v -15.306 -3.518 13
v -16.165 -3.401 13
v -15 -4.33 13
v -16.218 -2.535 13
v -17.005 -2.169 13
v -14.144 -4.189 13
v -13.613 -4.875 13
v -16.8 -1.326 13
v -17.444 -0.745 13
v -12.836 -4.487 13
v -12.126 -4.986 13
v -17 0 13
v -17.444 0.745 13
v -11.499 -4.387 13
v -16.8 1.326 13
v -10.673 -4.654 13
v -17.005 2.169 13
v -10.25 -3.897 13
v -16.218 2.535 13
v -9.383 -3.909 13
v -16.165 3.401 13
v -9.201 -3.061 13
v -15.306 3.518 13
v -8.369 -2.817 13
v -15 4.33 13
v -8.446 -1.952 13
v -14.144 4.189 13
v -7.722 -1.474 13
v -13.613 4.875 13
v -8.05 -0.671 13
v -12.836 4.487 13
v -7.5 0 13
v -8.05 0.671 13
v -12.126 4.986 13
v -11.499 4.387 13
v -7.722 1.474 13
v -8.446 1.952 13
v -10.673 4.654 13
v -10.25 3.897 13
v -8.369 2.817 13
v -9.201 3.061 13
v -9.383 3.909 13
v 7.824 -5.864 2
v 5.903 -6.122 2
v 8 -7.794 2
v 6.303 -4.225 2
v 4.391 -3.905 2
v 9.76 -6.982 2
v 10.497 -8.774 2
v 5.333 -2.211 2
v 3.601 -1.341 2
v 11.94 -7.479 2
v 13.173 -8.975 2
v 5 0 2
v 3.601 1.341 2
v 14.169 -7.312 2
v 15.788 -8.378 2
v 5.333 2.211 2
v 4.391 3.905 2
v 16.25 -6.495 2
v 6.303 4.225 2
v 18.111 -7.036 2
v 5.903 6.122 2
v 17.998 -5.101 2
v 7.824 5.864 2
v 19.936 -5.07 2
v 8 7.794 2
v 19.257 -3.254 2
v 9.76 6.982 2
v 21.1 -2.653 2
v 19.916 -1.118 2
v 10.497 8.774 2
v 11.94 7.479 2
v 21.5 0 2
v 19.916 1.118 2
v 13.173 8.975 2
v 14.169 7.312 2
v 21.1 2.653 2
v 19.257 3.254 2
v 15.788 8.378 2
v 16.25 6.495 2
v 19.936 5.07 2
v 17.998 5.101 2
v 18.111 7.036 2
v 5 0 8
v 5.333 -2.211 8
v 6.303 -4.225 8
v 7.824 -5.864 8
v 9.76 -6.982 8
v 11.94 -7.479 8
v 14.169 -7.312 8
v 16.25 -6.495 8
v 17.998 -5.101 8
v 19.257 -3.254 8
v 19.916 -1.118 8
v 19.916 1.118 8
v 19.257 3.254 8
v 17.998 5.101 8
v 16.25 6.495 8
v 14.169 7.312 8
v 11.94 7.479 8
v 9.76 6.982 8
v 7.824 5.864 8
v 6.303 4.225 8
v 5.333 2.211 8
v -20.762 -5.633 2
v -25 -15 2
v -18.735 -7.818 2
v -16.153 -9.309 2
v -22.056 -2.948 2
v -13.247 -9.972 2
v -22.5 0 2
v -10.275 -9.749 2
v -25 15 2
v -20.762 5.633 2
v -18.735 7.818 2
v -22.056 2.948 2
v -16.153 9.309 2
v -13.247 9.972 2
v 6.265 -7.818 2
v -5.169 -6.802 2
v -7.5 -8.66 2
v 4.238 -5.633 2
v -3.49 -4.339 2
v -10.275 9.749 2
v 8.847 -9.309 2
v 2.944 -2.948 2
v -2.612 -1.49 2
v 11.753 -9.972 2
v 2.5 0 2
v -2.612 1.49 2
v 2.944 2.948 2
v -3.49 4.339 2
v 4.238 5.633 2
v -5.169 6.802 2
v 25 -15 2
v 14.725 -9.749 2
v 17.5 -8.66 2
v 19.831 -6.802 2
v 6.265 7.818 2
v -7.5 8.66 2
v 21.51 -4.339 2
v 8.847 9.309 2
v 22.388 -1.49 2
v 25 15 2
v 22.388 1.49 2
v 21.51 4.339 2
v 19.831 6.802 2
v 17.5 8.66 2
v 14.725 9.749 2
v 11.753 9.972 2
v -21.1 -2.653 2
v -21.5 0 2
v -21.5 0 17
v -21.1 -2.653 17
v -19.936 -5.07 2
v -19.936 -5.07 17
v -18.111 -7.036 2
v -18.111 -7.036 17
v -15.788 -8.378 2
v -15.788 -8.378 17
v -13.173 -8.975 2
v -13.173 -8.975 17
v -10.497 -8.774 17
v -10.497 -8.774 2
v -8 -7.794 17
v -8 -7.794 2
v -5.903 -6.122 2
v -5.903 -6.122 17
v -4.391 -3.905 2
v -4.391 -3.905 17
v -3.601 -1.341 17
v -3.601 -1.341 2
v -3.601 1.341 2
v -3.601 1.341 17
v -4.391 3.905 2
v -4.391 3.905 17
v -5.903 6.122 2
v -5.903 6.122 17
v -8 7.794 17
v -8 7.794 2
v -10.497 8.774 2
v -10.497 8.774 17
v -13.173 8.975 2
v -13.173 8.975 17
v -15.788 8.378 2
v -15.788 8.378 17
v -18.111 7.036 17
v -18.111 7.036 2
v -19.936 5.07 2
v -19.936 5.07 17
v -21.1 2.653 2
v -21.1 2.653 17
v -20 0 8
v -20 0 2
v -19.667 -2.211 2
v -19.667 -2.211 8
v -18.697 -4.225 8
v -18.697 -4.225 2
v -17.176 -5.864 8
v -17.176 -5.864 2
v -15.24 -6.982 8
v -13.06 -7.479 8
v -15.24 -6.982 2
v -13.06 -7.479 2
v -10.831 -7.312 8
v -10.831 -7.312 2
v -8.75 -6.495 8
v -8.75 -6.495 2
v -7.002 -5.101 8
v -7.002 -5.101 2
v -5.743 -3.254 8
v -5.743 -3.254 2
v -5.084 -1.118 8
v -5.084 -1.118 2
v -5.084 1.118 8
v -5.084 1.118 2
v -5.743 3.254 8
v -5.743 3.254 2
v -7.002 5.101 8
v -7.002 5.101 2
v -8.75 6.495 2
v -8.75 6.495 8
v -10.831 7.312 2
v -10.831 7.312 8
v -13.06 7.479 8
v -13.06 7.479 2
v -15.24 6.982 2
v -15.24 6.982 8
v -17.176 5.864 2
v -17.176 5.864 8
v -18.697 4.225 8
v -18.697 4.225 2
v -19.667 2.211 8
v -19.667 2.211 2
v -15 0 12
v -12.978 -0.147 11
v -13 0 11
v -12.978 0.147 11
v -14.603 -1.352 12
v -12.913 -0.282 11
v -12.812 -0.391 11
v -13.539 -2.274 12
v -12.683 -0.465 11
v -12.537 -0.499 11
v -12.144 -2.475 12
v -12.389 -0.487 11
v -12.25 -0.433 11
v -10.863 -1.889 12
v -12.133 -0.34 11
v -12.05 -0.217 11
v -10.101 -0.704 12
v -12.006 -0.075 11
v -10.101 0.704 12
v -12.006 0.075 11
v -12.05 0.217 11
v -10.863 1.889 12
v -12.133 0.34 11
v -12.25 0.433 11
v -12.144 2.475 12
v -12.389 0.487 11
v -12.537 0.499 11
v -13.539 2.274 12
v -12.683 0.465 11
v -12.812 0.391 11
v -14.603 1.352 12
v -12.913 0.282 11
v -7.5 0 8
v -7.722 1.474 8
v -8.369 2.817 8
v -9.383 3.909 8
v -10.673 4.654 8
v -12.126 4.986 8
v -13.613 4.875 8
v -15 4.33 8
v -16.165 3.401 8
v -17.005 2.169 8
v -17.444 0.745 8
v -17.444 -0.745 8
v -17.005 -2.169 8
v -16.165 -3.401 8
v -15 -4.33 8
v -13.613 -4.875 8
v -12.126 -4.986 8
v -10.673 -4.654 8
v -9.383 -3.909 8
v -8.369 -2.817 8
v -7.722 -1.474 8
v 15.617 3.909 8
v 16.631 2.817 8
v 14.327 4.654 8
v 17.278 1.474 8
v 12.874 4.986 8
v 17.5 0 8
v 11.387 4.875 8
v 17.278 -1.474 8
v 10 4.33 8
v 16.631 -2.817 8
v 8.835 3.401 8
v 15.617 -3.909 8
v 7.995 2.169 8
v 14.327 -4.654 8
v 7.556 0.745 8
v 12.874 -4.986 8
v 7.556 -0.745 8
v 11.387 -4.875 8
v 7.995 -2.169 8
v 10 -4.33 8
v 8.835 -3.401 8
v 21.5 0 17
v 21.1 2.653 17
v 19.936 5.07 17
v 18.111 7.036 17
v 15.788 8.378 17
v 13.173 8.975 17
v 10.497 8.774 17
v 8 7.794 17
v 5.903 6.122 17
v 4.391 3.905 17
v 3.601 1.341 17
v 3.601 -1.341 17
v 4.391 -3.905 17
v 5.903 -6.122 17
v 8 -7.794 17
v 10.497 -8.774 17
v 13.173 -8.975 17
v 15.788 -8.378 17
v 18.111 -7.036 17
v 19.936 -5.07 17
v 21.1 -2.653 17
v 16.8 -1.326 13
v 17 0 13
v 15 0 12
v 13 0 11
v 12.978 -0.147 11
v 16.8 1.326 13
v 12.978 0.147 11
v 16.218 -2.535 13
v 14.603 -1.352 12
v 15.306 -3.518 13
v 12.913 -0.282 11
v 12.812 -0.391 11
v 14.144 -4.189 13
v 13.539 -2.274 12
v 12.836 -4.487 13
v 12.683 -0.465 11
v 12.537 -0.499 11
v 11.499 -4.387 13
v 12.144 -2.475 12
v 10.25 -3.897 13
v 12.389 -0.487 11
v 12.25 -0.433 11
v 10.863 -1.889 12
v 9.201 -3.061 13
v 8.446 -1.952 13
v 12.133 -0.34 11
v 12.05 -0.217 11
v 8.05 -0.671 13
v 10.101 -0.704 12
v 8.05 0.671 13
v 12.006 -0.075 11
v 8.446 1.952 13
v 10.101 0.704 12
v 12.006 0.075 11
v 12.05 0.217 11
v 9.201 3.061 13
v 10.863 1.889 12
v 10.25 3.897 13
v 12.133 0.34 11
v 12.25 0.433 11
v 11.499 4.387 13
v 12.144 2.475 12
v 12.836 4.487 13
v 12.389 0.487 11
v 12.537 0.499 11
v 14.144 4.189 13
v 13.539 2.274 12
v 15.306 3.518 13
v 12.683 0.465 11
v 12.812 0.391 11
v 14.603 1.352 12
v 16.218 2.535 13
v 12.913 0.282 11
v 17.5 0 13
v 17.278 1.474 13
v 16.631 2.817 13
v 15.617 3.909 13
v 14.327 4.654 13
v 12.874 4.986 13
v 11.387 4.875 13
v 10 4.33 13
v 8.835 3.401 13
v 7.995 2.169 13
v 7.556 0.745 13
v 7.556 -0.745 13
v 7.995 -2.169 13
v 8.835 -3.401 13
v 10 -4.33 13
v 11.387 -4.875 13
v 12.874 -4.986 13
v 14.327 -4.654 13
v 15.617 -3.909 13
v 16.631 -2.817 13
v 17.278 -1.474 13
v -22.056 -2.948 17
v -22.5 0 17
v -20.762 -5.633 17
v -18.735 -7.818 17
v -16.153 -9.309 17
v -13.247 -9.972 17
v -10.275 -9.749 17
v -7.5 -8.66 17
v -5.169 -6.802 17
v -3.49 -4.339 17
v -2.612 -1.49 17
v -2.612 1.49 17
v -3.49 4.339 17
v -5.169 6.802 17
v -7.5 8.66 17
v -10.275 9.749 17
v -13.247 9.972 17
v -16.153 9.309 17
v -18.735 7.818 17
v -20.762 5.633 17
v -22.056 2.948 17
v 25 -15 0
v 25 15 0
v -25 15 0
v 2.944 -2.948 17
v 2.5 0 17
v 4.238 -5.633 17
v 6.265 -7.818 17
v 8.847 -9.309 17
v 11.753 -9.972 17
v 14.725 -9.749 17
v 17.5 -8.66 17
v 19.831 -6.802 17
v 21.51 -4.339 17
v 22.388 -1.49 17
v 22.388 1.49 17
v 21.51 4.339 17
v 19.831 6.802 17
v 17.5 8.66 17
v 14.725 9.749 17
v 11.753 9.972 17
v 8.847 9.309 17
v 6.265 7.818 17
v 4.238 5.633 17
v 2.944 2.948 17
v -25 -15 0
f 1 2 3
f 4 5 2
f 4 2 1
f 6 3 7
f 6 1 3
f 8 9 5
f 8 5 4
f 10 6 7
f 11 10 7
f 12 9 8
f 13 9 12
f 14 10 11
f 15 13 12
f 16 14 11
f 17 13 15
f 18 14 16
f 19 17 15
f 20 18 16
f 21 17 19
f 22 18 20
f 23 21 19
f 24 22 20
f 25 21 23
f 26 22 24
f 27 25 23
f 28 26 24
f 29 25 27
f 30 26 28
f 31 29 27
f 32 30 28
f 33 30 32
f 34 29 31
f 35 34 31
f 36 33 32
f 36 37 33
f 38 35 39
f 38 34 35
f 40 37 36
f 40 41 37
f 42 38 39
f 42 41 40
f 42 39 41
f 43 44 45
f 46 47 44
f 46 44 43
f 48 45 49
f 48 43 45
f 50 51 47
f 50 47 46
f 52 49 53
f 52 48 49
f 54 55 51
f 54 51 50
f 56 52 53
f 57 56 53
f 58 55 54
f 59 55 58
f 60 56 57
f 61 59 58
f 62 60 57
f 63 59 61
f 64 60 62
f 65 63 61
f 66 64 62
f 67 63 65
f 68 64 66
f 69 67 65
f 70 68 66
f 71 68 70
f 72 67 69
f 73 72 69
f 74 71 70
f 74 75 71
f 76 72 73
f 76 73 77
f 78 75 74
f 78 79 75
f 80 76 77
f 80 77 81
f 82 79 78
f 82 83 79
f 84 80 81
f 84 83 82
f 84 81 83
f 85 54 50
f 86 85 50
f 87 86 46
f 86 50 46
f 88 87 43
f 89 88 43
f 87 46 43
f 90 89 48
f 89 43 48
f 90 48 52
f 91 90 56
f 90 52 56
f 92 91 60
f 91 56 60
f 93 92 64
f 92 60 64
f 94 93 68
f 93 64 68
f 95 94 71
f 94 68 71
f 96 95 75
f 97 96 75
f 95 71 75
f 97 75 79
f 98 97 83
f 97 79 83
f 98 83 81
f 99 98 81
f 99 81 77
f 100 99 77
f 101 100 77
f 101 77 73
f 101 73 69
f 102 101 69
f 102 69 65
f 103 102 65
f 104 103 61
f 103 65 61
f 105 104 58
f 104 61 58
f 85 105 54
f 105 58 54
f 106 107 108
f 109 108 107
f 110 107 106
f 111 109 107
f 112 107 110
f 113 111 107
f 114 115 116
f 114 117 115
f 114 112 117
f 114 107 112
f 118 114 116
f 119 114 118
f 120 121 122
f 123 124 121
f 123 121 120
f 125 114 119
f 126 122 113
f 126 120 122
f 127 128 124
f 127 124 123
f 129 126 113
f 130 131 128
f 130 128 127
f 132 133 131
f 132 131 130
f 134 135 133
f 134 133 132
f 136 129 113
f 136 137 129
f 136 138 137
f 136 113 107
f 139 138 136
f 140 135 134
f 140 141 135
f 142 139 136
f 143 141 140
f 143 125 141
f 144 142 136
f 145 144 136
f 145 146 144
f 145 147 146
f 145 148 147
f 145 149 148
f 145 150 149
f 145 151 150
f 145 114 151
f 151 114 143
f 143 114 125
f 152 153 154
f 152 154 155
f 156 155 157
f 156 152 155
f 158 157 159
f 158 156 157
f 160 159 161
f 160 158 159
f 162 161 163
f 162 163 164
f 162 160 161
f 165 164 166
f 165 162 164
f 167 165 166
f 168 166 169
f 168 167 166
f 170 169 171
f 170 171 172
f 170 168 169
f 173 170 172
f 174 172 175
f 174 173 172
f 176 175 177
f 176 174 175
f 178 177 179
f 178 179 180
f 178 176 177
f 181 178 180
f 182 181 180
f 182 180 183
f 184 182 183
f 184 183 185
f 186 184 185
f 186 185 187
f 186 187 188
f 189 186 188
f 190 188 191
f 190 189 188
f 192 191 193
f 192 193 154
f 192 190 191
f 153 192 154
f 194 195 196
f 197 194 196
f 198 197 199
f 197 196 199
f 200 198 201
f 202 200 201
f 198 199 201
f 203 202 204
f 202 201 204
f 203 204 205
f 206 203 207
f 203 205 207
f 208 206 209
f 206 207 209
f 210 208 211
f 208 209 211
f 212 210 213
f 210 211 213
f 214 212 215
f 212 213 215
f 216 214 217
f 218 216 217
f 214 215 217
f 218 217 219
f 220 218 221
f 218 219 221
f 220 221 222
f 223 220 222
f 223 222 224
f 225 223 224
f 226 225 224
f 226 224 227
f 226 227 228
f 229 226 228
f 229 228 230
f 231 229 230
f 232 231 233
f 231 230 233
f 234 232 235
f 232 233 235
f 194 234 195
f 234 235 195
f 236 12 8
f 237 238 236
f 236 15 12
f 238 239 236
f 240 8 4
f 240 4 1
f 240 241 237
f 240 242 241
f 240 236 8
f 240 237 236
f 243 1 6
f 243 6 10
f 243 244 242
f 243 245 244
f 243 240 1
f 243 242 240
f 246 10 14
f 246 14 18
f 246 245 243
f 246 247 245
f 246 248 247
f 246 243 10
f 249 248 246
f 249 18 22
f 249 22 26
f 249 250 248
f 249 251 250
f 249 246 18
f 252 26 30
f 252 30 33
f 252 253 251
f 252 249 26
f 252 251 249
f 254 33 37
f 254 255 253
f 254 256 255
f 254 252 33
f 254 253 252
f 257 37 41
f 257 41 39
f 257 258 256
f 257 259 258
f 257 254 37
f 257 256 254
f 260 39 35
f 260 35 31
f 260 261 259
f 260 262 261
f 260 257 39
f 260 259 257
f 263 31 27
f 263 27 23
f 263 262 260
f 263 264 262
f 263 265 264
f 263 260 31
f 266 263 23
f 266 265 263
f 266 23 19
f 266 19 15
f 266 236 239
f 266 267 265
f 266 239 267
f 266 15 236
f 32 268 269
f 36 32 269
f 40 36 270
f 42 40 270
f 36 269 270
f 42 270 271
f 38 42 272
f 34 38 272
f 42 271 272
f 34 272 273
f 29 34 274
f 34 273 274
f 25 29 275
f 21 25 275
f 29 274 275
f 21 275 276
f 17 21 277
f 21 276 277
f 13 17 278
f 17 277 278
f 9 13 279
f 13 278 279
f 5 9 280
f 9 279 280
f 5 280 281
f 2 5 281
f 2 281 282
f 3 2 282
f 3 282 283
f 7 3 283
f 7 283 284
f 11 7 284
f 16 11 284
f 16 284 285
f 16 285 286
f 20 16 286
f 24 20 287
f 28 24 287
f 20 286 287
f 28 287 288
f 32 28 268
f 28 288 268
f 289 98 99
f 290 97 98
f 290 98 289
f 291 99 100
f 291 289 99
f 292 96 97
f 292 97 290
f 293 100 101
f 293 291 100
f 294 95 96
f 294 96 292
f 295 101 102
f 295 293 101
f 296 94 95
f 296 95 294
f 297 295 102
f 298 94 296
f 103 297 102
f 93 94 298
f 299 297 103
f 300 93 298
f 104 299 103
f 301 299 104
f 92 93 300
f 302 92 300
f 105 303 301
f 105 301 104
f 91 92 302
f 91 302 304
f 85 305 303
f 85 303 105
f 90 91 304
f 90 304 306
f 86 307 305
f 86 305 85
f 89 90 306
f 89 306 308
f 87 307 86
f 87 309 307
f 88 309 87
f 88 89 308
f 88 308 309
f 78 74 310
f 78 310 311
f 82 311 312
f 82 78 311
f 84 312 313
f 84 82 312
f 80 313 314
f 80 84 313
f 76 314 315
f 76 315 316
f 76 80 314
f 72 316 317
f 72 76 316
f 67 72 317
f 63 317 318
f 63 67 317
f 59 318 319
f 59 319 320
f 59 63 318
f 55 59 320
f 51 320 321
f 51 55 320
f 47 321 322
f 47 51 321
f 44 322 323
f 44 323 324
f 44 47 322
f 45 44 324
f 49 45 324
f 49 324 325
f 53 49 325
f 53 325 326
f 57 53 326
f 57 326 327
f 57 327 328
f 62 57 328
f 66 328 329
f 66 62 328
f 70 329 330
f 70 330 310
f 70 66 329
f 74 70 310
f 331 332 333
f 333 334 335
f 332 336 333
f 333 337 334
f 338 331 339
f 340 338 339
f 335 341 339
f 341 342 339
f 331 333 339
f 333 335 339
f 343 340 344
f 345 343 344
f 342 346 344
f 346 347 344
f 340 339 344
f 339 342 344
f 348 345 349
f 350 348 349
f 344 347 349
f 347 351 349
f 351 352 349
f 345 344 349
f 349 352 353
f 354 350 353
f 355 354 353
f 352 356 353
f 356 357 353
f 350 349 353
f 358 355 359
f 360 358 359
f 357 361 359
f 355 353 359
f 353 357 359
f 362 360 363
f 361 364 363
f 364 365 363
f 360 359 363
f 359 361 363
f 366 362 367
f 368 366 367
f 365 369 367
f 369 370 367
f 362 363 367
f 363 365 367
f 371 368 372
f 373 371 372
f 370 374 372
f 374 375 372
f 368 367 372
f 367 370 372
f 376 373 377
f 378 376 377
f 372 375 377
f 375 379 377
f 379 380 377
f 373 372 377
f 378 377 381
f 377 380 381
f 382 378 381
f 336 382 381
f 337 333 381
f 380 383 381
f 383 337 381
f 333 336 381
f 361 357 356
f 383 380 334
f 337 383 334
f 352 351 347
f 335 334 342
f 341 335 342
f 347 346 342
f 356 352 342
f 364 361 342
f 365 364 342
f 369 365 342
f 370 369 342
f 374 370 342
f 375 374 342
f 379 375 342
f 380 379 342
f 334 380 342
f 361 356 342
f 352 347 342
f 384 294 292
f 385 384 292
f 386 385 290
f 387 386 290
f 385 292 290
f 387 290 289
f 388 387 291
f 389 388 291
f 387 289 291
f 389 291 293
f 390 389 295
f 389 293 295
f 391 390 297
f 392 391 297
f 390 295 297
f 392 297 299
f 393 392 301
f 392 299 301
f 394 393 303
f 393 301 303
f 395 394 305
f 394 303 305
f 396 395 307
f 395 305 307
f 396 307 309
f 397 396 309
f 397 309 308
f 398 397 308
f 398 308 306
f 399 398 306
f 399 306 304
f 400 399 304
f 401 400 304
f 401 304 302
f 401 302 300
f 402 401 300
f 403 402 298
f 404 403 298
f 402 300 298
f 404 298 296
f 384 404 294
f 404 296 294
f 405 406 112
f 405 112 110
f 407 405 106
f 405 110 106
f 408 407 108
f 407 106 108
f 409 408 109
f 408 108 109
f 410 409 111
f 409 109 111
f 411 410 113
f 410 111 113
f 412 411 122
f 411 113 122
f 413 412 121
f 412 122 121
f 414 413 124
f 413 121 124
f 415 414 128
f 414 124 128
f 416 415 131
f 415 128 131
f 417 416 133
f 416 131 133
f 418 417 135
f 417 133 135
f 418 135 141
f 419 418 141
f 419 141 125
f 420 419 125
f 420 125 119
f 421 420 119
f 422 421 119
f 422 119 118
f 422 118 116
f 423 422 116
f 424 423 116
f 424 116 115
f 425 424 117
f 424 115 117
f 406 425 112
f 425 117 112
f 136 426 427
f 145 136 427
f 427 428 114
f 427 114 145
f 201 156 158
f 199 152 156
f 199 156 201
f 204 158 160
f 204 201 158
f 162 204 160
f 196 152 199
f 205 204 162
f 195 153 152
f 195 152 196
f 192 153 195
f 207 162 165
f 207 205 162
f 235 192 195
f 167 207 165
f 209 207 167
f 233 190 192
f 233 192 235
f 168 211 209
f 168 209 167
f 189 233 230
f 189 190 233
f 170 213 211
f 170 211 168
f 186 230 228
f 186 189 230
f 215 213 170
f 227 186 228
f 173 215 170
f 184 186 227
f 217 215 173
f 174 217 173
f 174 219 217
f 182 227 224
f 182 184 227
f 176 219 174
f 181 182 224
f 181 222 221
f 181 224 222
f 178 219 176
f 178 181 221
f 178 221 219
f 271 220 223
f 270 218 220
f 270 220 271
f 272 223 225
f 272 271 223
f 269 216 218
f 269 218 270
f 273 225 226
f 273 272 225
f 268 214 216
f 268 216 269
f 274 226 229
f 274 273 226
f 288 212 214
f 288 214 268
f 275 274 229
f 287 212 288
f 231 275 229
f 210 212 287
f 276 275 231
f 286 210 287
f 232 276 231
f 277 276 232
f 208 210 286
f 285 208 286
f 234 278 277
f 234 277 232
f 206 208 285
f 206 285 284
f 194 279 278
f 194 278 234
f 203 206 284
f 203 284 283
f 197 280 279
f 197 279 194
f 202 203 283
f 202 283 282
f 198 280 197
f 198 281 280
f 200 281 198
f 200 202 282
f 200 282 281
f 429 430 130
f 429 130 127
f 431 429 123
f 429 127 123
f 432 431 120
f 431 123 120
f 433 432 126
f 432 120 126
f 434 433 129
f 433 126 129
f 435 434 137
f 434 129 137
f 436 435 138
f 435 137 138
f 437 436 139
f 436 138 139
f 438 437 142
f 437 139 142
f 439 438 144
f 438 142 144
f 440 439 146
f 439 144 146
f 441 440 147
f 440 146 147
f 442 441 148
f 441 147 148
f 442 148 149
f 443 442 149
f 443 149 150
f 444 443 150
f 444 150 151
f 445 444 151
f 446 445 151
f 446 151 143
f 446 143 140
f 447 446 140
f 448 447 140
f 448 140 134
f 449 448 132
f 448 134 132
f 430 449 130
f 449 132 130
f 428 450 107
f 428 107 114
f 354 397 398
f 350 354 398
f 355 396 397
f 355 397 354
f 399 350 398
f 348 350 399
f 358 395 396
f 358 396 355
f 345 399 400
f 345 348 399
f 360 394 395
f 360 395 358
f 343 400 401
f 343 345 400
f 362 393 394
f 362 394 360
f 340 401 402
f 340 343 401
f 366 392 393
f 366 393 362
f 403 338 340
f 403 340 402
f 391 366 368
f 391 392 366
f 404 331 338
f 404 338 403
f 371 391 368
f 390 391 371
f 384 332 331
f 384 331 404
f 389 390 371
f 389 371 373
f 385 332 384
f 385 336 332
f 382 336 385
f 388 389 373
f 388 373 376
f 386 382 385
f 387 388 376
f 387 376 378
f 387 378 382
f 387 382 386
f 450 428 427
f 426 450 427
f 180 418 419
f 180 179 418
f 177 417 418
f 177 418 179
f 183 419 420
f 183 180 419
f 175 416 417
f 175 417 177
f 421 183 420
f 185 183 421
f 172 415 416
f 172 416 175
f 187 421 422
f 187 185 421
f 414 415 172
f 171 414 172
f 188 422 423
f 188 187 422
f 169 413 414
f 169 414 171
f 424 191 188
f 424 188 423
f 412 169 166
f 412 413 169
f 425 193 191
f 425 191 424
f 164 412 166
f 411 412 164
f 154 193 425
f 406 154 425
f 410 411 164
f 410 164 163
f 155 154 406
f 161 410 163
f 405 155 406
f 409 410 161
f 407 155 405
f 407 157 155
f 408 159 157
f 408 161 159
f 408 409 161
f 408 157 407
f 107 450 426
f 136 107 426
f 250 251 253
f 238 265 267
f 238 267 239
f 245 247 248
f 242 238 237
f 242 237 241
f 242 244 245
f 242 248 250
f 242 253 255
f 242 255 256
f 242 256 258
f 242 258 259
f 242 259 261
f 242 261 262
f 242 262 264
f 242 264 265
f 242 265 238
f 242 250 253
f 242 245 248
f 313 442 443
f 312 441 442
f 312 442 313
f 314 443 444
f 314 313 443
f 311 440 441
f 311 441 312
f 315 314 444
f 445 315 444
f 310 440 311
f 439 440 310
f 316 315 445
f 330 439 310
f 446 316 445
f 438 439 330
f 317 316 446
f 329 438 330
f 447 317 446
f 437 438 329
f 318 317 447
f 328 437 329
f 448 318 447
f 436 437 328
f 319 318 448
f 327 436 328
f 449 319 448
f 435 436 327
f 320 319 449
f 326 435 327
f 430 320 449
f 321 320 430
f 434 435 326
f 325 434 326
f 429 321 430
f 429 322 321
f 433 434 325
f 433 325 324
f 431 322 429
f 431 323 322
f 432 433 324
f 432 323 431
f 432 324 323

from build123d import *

# Parameters (mm, degrees)
SKETCH_1_W      = 50
SKETCH_1_H      = 30
EXTRUDE_1_DEPTH = 2
SKETCH_2_R      = 10
SKETCH_2_R_2    = 9
EXTRUDE_2_DEPTH = 15
SKETCH_3_R      = 7.5
EXTRUDE_3_DEPTH = 6
SKETCH_4_R      = 5
EXTRUDE_4_DEPTH = 5


with BuildPart() as part:
    # 草图1 → 凸台-拉伸1 (new body)
    with BuildSketch(Plane.XY):
        Rectangle(SKETCH_1_W, SKETCH_1_H)
    extrude(amount=EXTRUDE_1_DEPTH)

    # 草图2 → 凸台-拉伸2 (add)
    # profile 1 of 2: a face of its own
    with BuildSketch(Plane.XY.offset(2)):
        with Locations(Location((12.5, 0, 0), (0, 0, 180))):
            Circle(SKETCH_2_R)
        with Locations((12.5, 0)):
            Circle(SKETCH_2_R_2, mode=Mode.SUBTRACT)
    # profile 2 of 2: a face of its own
    with BuildSketch(Plane.XY.offset(2)):
        with Locations(Location((-12.5, 0, 0), (0, 0, 180))):
            Circle(SKETCH_2_R)
        with Locations(Location((-12.5, 0, 0), (0, 0, 180))):
            Circle(SKETCH_2_R_2, mode=Mode.SUBTRACT)
    extrude(amount=EXTRUDE_2_DEPTH)

    # 草图3 → 凸台-拉伸3 (add)
    with BuildSketch(Plane.XY.offset(2)):
        with Locations(Location((12.5, 0, 0), (0, 0, 180))):
            Circle(SKETCH_3_R)
        with Locations(Location((-12.5, 0, 0), (0, 0, 180))):
            Circle(SKETCH_3_R)
    extrude(amount=EXTRUDE_3_DEPTH)

    # 草图4 → 凸台-拉伸4 (add)
    with BuildSketch(Plane.XY.offset(8)):
        with Locations((-12.5, 0)):
            Circle(SKETCH_4_R)
        with Locations((12.5, 0)):
            Circle(SKETCH_4_R)
    extrude(amount=EXTRUDE_4_DEPTH)

    # 草图5 → 切除-旋转1 (revolve, cut)
    with BuildSketch(Plane(origin=(0, 0, 0), x_dir=(1, 0, 0), z_dir=(0, 1, 0))):
        Polygon((12.5, -13), (17, -13), (13, -11), (12.5, -11), align=None)
    cut_revolve_1 = revolve(axis=Axis((12.5, 0, 14.465329718), (0, 0, -1)), mode=Mode.SUBTRACT)

    # 镜向1: 切除-旋转1 across plane
    add(cut_revolve_1.mirror(Plane(origin=(0, 0, 0), x_dir=(0, 0, 1), z_dir=(1, 0, 0))), mode=Mode.SUBTRACT)


solid = part.part
